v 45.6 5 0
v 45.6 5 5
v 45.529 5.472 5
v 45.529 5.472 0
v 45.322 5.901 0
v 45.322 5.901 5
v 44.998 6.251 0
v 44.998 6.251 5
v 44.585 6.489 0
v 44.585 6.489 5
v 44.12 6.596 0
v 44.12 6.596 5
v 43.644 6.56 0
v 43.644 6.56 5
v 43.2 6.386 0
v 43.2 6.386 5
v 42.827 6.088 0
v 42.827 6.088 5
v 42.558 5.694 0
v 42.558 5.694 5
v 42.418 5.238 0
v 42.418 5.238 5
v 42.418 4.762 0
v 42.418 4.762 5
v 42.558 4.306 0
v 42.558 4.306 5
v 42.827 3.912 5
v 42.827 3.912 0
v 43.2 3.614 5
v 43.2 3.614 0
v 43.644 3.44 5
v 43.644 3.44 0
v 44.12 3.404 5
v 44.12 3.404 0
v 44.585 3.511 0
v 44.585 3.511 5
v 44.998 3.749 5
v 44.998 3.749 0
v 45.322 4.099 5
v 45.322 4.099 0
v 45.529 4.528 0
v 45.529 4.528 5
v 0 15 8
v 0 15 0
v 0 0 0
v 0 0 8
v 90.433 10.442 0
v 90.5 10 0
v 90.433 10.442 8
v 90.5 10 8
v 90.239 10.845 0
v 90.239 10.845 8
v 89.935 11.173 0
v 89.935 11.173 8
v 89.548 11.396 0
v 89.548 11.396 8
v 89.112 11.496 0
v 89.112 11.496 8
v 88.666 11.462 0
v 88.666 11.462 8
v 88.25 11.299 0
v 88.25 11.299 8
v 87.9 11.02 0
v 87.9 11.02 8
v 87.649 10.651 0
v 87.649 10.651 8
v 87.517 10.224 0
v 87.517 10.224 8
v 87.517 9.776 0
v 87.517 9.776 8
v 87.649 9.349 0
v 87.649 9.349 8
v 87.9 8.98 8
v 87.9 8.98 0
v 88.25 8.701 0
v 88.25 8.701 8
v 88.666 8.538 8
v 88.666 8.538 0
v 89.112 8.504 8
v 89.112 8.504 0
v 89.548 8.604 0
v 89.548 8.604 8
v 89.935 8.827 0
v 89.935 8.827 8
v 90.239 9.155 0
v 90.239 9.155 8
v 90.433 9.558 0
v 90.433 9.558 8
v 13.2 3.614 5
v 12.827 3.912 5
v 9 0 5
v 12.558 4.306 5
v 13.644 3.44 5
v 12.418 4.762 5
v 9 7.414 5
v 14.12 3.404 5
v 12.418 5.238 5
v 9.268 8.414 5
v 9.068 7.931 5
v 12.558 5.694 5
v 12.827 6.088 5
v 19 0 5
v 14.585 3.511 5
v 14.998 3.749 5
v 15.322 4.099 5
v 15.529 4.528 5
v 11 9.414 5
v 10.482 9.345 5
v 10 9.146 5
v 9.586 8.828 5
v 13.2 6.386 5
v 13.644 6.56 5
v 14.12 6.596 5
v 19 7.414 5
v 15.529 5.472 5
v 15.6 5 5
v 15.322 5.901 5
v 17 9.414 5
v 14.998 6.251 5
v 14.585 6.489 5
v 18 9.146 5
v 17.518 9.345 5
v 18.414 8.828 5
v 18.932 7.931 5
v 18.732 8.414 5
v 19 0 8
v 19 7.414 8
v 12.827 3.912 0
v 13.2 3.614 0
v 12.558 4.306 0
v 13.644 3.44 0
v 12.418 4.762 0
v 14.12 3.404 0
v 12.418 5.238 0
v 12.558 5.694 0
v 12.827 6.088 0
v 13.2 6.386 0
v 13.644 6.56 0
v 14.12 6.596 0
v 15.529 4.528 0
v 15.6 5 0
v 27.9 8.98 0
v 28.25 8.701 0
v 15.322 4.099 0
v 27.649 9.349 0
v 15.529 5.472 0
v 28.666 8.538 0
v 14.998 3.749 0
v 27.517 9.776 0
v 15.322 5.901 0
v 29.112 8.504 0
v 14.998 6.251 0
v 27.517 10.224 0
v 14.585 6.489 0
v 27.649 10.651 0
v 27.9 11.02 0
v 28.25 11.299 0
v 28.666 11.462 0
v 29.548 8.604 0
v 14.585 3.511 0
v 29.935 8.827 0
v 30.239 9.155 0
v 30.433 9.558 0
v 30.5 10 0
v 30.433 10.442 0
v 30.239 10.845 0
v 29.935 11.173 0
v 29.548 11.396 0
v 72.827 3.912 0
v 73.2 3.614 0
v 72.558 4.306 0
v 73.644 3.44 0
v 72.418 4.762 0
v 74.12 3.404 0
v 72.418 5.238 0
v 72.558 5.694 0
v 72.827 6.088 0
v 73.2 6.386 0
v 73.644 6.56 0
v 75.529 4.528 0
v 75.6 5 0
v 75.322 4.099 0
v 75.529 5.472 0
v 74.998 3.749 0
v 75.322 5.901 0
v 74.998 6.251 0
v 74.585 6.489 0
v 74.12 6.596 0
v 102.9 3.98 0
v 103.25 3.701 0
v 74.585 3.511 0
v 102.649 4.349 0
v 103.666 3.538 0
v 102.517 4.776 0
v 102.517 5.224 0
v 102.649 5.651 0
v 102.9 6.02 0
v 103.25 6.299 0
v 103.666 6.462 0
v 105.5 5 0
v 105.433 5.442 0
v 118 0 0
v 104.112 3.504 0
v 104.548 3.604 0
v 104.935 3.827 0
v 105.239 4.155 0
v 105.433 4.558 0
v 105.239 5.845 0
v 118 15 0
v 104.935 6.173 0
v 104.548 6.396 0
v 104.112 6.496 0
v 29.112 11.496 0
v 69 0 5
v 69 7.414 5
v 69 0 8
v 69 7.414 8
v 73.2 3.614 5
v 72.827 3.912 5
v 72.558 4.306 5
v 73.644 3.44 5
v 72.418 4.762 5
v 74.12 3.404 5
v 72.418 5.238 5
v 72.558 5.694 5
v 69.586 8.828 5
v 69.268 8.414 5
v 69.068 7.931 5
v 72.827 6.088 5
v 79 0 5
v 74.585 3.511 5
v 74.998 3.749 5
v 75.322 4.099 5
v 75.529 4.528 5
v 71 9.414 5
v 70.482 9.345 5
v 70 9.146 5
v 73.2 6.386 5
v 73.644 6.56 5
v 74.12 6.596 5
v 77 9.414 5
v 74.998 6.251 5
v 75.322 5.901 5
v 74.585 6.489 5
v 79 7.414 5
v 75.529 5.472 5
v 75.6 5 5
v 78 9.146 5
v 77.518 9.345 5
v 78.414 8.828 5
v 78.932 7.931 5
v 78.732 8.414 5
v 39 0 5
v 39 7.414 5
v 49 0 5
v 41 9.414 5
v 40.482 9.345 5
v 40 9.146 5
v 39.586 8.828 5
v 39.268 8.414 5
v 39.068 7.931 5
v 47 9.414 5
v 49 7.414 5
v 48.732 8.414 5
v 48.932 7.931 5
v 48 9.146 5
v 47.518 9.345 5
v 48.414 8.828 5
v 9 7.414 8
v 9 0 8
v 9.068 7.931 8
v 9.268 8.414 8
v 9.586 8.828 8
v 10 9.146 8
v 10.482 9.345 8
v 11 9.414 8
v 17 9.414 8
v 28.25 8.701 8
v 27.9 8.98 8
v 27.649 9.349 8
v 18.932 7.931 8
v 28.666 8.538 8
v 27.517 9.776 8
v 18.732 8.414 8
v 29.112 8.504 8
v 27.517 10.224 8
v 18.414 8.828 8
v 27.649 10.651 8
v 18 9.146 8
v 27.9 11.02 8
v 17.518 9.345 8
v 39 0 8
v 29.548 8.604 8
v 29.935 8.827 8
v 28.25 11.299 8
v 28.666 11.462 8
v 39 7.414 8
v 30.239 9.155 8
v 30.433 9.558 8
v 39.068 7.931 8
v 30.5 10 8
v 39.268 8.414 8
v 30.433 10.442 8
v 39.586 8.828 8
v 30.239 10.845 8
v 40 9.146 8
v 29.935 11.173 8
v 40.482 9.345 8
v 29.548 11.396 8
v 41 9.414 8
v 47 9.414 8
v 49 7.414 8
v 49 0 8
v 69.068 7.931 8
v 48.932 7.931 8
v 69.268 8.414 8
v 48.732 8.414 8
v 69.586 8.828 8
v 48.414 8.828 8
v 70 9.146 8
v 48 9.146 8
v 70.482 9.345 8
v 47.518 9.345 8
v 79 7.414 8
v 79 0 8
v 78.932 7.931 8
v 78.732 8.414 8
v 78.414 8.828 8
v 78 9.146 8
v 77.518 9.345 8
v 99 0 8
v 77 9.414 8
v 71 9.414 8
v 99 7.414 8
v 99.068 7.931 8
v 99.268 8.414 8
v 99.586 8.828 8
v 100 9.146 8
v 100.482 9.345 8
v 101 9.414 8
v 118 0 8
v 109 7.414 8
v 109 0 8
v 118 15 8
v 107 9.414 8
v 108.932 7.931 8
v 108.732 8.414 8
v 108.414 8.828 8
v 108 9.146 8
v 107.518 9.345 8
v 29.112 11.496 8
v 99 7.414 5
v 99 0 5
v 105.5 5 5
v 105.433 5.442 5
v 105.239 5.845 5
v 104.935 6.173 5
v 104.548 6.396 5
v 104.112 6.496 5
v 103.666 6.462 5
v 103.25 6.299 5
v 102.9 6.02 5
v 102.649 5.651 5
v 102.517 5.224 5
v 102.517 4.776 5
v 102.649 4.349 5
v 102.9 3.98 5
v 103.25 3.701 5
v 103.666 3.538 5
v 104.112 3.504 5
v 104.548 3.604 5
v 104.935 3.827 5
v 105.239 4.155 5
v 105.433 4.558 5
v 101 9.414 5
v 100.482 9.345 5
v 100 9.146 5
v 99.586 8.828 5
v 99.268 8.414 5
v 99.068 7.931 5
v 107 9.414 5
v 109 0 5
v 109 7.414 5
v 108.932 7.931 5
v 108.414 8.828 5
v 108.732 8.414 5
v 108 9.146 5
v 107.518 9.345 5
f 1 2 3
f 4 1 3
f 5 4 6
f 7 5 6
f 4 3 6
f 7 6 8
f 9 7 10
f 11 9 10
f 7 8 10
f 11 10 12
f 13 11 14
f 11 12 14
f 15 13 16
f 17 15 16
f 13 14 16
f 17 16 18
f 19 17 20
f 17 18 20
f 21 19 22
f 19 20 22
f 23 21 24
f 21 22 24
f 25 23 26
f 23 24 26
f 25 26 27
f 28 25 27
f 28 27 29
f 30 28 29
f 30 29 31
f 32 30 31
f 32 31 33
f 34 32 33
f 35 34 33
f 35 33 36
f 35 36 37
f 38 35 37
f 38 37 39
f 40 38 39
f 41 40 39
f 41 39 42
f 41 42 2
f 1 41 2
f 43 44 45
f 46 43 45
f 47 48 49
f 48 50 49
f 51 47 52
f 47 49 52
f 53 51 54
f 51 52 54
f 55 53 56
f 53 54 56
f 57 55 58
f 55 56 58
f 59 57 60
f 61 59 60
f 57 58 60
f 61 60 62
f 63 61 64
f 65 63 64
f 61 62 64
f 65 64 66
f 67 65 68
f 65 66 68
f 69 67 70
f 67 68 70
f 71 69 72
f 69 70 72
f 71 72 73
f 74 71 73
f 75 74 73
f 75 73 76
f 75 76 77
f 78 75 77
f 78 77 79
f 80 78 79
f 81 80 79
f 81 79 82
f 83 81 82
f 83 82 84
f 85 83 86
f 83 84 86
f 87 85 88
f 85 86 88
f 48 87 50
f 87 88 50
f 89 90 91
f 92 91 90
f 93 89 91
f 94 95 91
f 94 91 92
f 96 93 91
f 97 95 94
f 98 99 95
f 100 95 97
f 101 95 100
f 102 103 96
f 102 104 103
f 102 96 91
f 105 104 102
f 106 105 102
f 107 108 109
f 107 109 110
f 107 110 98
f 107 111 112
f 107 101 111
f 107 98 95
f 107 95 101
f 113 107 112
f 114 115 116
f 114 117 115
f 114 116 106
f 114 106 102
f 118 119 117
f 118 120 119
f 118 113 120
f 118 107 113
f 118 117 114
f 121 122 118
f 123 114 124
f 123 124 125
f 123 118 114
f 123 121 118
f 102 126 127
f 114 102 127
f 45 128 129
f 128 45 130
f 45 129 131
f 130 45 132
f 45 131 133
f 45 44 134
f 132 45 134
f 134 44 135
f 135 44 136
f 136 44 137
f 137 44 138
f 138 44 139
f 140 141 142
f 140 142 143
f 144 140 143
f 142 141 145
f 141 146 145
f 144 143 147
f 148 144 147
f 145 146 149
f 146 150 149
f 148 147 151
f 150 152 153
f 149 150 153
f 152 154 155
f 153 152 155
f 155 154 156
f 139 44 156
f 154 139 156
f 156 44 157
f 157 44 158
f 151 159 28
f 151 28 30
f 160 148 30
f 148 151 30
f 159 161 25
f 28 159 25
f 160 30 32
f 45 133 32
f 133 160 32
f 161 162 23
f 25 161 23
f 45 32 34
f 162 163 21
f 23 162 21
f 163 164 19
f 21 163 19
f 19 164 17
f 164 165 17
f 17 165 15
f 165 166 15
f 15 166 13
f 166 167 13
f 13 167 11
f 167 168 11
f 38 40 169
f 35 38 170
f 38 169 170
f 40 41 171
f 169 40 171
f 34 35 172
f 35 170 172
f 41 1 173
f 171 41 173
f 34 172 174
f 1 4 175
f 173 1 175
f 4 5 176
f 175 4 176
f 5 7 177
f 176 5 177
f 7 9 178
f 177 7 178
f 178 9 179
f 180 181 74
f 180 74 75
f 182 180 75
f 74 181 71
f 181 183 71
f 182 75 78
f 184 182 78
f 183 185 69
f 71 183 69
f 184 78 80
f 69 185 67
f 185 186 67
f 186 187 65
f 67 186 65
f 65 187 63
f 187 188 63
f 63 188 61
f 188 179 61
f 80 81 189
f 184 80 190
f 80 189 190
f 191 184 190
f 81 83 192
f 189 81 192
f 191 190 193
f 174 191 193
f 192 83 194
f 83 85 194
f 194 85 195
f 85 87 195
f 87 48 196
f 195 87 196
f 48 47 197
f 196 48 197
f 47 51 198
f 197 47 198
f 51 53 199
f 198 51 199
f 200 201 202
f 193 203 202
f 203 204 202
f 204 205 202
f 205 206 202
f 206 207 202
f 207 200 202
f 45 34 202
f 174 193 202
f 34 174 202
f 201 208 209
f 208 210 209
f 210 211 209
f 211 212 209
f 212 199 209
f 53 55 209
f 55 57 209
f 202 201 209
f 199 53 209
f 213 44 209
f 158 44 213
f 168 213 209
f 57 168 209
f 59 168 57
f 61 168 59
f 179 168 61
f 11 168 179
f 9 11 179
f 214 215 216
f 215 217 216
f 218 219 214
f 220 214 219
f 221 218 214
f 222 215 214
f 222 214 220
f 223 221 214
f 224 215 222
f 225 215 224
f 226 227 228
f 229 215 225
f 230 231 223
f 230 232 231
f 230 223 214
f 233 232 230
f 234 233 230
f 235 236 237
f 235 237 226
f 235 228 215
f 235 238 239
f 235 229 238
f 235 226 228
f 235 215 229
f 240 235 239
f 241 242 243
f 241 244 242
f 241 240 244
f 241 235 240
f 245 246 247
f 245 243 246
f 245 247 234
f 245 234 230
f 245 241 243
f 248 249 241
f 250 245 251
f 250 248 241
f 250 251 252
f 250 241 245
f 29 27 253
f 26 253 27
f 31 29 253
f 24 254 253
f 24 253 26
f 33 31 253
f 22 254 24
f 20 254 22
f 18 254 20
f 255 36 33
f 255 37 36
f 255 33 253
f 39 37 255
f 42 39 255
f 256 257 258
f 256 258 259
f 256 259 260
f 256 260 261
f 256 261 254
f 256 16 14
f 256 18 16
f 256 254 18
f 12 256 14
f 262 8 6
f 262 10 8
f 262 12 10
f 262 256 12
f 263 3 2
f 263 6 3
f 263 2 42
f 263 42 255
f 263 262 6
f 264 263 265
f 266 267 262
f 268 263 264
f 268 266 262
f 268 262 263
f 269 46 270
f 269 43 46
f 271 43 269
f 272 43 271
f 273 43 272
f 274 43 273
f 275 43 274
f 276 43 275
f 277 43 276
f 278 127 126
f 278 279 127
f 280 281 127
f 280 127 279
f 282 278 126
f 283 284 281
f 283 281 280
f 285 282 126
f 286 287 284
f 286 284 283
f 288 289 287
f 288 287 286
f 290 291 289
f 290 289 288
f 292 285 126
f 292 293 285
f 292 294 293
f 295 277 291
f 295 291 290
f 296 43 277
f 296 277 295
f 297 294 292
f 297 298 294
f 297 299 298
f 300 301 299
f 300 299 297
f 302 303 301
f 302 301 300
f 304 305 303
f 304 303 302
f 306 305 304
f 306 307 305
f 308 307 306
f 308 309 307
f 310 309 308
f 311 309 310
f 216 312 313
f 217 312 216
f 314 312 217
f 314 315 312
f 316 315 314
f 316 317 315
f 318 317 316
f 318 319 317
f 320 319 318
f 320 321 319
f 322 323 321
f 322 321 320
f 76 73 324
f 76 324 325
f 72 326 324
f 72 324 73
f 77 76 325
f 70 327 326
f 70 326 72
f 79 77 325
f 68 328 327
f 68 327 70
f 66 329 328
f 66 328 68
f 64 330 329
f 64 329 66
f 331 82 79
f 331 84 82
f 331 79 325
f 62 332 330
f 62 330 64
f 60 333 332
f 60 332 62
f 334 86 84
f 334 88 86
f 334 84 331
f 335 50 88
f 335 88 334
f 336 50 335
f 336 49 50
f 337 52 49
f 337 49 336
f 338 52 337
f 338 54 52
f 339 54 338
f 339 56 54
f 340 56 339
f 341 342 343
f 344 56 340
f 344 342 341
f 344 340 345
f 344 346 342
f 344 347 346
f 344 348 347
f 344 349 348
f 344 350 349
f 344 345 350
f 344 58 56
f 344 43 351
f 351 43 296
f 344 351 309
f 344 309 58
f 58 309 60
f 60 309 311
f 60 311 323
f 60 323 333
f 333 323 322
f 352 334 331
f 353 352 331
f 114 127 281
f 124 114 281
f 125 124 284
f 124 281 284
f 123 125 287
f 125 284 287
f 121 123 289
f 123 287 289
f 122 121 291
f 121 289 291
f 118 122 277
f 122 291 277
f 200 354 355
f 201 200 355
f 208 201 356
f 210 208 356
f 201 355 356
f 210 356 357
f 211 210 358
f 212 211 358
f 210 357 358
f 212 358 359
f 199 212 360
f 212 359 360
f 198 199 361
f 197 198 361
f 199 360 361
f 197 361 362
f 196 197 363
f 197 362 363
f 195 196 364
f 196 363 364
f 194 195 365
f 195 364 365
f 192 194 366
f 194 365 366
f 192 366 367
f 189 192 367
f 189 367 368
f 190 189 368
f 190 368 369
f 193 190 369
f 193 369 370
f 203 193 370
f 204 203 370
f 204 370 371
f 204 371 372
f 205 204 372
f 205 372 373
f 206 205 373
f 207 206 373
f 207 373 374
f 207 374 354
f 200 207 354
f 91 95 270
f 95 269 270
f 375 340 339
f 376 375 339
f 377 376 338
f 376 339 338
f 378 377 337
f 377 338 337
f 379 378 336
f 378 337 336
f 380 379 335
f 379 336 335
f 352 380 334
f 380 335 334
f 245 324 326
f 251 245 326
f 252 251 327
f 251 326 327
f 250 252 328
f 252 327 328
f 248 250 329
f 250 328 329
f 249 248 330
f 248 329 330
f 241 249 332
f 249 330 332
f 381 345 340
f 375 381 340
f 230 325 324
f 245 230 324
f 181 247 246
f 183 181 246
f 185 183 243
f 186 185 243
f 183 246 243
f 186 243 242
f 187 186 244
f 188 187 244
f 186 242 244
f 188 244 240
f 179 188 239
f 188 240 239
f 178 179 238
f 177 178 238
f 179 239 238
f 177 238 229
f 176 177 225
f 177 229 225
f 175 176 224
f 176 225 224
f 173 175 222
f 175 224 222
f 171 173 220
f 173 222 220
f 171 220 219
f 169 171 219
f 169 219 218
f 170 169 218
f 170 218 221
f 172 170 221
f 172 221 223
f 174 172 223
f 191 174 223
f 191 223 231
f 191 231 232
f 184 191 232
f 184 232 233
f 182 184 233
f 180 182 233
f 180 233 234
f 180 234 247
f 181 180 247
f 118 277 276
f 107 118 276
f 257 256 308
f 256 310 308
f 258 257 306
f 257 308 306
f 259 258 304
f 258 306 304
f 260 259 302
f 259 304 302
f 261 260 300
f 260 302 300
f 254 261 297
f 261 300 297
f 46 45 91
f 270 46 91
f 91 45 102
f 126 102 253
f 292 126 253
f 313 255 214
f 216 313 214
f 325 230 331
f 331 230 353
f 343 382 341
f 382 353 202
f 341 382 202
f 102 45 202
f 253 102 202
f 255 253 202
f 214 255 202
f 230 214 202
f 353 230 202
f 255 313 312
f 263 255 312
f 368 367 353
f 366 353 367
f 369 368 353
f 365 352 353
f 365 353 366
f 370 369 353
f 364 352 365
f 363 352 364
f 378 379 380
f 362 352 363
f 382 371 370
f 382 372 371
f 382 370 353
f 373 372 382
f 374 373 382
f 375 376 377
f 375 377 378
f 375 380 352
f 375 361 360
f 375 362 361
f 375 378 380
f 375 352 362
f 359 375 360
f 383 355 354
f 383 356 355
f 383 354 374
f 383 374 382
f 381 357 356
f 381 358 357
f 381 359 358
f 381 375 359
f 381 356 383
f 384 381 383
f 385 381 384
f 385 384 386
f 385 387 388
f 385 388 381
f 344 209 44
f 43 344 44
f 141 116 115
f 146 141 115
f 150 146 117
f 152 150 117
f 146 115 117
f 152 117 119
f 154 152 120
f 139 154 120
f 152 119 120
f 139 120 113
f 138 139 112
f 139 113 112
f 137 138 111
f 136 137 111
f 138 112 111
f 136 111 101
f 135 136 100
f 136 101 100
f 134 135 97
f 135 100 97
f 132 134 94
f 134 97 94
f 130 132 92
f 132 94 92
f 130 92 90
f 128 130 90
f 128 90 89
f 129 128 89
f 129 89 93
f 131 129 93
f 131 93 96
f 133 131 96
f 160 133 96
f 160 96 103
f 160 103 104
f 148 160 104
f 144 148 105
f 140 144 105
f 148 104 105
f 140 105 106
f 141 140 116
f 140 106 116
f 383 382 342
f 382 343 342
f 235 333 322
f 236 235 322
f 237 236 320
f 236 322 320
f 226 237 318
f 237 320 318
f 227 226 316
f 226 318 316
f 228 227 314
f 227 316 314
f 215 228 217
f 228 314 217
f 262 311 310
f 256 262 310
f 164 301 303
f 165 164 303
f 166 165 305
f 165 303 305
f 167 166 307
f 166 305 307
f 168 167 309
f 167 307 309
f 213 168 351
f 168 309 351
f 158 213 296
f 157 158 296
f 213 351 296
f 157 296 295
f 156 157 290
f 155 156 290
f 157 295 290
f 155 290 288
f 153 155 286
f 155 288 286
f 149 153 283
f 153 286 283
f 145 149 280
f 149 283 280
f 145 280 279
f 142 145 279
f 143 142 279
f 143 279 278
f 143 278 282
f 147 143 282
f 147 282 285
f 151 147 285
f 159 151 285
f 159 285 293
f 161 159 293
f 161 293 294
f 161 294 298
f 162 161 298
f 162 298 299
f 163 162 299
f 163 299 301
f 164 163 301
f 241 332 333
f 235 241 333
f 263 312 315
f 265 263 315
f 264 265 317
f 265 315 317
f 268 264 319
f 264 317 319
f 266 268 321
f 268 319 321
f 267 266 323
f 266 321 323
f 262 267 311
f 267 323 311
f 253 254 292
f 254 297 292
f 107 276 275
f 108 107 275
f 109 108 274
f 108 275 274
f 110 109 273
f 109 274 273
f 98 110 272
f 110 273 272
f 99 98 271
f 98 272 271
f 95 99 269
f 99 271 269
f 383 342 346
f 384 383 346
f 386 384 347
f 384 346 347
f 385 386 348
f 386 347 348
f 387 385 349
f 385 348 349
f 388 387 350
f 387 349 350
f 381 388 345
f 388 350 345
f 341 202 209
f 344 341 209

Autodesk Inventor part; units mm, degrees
ref_plane "YZ Plane" through (0, 0, 0) normal (1, 0, 0) x (0, 1, 0)
ref_plane "XZ Plane" through (0, 0, 0) normal (0, 1, 0) x (-1, 0, 0)
ref_plane "XY Plane" through (0, 0, 0) normal (0, 0, 1) x (1, 0, 0)
sketch "Sketch1" plane through (0, 0, 0) normal (0, 0, 1) x (1, 0, 0)
  line L0 (0, 0) -> (118, 0)
  line L1 (118, 0) -> (118, 15)
  line L2 (118, 15) -> (0, 15)
  line L3 (0, 15) -> (0, 0)
  dimension "d0" = 118
  dimension "d1" = 15
extrude "Extrusion1" add sketch "Sketch1" along normal blind 8
sketch "Sketch2" plane through (0, 0, 8) normal (0, 0, 1) x (1, 0, 0)
  circle A0 centre (14, 5) radius 1.6
  circle A1 centre (44, 5) radius 1.6
  circle A2 centre (74, 5) radius 1.6
  line L0 (0, 15) -> (0, 0) projected
  line L1 (118, 0) -> (118, 15) projected
  line L2 (0, 0) -> (118, 0) projected
  circle A3 centre (104, 5) radius 1.5
  line L3 (118, 15) -> (0, 15) projected
  circle A4 centre (29, 10) radius 1.5
  circle A5 centre (89, 10) radius 1.5
  point P0 (59, 0)
  dimension "d4" = 3.2
  dimension "d5" = 3.2
  dimension "d6" = 3.2
  dimension "d11" = 5
  dimension "d14" = 3
  dimension "d15" = 30
  dimension "d16" = 30
  dimension "d17" = 30
  dimension "d18" = 14
  dimension "d19" = 14
  dimension "d20" = 3
  dimension "d21" = 3
  dimension "d22" = 5
  dimension "d23" = 29
  dimension "d24" = 29
extrude "Extrusion2" cut sketch "Sketch2" against normal blind 10 contours A0 | A1 | A2 | A3 | A4 | A5
sketch "Sketch3" plane through (0, 0, 8) normal (0, 0, 1) x (1, 0, 0)
  circle A0 centre (44, 5) radius 1.6 projected
  circle A1 centre (104, 5) radius 1.5 projected
  circle A2 centre (14, 5) radius 1.6 projected
  circle A3 centre (74, 5) radius 1.6 projected
  arc A4 (19, 7.4135) -> (17, 9.4135) centre (17, 7.4135) ccw projected
  line L0 (17, 9.4135) -> (11, 9.4135) projected
  arc A5 (11, 9.4135) -> (9, 7.4135) centre (11, 7.4135) ccw projected
  line L1 (9, 7.4135) -> (9, -0.5865) projected
  arc A6 (19, -0.5865) -> (9, -0.5865) centre (14, -8.0699) ccw projected
  line L2 (19, -0.5865) -> (19, 7.4135) projected
  circle A7 centre (14, 5) radius 1.6 projected
  arc A8 (49, 7.4135) -> (47, 9.4135) centre (47, 7.4135) ccw projected
  line L3 (47, 9.4135) -> (41, 9.4135) projected
  arc A9 (41, 9.4135) -> (39, 7.4135) centre (41, 7.4135) ccw projected
  line L4 (39, 7.4135) -> (39, -0.5865) projected
  arc A10 (49, -0.5865) -> (39, -0.5865) centre (44, -8.0699) ccw projected
  line L5 (49, -0.5865) -> (49, 7.4135) projected
  circle A11 centre (44, 5) radius 1.6 projected
  arc A12 (79, 7.4135) -> (77, 9.4135) centre (77, 7.4135) ccw projected
  line L6 (77, 9.4135) -> (71, 9.4135) projected
  arc A13 (71, 9.4135) -> (69, 7.4135) centre (71, 7.4135) ccw projected
  line L7 (69, 7.4135) -> (69, -0.5865) projected
  arc A14 (79, -0.5865) -> (69, -0.5865) centre (74, -8.0699) ccw projected
  line L8 (79, -0.5865) -> (79, 7.4135) projected
  circle A15 centre (74, 5) radius 1.6 projected
  arc A16 (109, 7.4135) -> (107, 9.4135) centre (107, 7.4135) ccw projected
  line L9 (107, 9.4135) -> (101, 9.4135) projected
  arc A17 (101, 9.4135) -> (99, 7.4135) centre (101, 7.4135) ccw projected
  line L10 (99, 7.4135) -> (99, -0.5865) projected
  arc A18 (109, -0.5865) -> (99, -0.5865) centre (104, -8.0699) ccw projected
  line L11 (109, -0.5865) -> (109, 7.4135) projected
  circle A19 centre (104, 5) radius 1.6 projected
  line L12 (9, -0.5865) -> (19, -0.5865)
  line L13 (39, -0.5865) -> (49, -0.5865)
  line L14 (69, -0.5865) -> (79, -0.5865)
  line L15 (99, -0.5865) -> (109, -0.5865)
extrude "Extrusion3" cut sketch "Sketch3" against normal blind 3 contours A1 | L2 A6 L1 A5 L0 A4 | L12 A6 | L5 A10 L4 A9 L3 A8 | L13 A10 | L8 A14 L7 A13 L6 A12 | L14 A14 | L11 A18 L10 A17 L9 A16 | L15 A18 | A19
equation "\"d15\" = d16"
equation "\"d16\" = d17"
equation "\"d18\" = d19"
equation "\"d23\" = d24"
equation "\"d24\" = d19 + 0.5 * d15"
properties part number "brush rack holder"
